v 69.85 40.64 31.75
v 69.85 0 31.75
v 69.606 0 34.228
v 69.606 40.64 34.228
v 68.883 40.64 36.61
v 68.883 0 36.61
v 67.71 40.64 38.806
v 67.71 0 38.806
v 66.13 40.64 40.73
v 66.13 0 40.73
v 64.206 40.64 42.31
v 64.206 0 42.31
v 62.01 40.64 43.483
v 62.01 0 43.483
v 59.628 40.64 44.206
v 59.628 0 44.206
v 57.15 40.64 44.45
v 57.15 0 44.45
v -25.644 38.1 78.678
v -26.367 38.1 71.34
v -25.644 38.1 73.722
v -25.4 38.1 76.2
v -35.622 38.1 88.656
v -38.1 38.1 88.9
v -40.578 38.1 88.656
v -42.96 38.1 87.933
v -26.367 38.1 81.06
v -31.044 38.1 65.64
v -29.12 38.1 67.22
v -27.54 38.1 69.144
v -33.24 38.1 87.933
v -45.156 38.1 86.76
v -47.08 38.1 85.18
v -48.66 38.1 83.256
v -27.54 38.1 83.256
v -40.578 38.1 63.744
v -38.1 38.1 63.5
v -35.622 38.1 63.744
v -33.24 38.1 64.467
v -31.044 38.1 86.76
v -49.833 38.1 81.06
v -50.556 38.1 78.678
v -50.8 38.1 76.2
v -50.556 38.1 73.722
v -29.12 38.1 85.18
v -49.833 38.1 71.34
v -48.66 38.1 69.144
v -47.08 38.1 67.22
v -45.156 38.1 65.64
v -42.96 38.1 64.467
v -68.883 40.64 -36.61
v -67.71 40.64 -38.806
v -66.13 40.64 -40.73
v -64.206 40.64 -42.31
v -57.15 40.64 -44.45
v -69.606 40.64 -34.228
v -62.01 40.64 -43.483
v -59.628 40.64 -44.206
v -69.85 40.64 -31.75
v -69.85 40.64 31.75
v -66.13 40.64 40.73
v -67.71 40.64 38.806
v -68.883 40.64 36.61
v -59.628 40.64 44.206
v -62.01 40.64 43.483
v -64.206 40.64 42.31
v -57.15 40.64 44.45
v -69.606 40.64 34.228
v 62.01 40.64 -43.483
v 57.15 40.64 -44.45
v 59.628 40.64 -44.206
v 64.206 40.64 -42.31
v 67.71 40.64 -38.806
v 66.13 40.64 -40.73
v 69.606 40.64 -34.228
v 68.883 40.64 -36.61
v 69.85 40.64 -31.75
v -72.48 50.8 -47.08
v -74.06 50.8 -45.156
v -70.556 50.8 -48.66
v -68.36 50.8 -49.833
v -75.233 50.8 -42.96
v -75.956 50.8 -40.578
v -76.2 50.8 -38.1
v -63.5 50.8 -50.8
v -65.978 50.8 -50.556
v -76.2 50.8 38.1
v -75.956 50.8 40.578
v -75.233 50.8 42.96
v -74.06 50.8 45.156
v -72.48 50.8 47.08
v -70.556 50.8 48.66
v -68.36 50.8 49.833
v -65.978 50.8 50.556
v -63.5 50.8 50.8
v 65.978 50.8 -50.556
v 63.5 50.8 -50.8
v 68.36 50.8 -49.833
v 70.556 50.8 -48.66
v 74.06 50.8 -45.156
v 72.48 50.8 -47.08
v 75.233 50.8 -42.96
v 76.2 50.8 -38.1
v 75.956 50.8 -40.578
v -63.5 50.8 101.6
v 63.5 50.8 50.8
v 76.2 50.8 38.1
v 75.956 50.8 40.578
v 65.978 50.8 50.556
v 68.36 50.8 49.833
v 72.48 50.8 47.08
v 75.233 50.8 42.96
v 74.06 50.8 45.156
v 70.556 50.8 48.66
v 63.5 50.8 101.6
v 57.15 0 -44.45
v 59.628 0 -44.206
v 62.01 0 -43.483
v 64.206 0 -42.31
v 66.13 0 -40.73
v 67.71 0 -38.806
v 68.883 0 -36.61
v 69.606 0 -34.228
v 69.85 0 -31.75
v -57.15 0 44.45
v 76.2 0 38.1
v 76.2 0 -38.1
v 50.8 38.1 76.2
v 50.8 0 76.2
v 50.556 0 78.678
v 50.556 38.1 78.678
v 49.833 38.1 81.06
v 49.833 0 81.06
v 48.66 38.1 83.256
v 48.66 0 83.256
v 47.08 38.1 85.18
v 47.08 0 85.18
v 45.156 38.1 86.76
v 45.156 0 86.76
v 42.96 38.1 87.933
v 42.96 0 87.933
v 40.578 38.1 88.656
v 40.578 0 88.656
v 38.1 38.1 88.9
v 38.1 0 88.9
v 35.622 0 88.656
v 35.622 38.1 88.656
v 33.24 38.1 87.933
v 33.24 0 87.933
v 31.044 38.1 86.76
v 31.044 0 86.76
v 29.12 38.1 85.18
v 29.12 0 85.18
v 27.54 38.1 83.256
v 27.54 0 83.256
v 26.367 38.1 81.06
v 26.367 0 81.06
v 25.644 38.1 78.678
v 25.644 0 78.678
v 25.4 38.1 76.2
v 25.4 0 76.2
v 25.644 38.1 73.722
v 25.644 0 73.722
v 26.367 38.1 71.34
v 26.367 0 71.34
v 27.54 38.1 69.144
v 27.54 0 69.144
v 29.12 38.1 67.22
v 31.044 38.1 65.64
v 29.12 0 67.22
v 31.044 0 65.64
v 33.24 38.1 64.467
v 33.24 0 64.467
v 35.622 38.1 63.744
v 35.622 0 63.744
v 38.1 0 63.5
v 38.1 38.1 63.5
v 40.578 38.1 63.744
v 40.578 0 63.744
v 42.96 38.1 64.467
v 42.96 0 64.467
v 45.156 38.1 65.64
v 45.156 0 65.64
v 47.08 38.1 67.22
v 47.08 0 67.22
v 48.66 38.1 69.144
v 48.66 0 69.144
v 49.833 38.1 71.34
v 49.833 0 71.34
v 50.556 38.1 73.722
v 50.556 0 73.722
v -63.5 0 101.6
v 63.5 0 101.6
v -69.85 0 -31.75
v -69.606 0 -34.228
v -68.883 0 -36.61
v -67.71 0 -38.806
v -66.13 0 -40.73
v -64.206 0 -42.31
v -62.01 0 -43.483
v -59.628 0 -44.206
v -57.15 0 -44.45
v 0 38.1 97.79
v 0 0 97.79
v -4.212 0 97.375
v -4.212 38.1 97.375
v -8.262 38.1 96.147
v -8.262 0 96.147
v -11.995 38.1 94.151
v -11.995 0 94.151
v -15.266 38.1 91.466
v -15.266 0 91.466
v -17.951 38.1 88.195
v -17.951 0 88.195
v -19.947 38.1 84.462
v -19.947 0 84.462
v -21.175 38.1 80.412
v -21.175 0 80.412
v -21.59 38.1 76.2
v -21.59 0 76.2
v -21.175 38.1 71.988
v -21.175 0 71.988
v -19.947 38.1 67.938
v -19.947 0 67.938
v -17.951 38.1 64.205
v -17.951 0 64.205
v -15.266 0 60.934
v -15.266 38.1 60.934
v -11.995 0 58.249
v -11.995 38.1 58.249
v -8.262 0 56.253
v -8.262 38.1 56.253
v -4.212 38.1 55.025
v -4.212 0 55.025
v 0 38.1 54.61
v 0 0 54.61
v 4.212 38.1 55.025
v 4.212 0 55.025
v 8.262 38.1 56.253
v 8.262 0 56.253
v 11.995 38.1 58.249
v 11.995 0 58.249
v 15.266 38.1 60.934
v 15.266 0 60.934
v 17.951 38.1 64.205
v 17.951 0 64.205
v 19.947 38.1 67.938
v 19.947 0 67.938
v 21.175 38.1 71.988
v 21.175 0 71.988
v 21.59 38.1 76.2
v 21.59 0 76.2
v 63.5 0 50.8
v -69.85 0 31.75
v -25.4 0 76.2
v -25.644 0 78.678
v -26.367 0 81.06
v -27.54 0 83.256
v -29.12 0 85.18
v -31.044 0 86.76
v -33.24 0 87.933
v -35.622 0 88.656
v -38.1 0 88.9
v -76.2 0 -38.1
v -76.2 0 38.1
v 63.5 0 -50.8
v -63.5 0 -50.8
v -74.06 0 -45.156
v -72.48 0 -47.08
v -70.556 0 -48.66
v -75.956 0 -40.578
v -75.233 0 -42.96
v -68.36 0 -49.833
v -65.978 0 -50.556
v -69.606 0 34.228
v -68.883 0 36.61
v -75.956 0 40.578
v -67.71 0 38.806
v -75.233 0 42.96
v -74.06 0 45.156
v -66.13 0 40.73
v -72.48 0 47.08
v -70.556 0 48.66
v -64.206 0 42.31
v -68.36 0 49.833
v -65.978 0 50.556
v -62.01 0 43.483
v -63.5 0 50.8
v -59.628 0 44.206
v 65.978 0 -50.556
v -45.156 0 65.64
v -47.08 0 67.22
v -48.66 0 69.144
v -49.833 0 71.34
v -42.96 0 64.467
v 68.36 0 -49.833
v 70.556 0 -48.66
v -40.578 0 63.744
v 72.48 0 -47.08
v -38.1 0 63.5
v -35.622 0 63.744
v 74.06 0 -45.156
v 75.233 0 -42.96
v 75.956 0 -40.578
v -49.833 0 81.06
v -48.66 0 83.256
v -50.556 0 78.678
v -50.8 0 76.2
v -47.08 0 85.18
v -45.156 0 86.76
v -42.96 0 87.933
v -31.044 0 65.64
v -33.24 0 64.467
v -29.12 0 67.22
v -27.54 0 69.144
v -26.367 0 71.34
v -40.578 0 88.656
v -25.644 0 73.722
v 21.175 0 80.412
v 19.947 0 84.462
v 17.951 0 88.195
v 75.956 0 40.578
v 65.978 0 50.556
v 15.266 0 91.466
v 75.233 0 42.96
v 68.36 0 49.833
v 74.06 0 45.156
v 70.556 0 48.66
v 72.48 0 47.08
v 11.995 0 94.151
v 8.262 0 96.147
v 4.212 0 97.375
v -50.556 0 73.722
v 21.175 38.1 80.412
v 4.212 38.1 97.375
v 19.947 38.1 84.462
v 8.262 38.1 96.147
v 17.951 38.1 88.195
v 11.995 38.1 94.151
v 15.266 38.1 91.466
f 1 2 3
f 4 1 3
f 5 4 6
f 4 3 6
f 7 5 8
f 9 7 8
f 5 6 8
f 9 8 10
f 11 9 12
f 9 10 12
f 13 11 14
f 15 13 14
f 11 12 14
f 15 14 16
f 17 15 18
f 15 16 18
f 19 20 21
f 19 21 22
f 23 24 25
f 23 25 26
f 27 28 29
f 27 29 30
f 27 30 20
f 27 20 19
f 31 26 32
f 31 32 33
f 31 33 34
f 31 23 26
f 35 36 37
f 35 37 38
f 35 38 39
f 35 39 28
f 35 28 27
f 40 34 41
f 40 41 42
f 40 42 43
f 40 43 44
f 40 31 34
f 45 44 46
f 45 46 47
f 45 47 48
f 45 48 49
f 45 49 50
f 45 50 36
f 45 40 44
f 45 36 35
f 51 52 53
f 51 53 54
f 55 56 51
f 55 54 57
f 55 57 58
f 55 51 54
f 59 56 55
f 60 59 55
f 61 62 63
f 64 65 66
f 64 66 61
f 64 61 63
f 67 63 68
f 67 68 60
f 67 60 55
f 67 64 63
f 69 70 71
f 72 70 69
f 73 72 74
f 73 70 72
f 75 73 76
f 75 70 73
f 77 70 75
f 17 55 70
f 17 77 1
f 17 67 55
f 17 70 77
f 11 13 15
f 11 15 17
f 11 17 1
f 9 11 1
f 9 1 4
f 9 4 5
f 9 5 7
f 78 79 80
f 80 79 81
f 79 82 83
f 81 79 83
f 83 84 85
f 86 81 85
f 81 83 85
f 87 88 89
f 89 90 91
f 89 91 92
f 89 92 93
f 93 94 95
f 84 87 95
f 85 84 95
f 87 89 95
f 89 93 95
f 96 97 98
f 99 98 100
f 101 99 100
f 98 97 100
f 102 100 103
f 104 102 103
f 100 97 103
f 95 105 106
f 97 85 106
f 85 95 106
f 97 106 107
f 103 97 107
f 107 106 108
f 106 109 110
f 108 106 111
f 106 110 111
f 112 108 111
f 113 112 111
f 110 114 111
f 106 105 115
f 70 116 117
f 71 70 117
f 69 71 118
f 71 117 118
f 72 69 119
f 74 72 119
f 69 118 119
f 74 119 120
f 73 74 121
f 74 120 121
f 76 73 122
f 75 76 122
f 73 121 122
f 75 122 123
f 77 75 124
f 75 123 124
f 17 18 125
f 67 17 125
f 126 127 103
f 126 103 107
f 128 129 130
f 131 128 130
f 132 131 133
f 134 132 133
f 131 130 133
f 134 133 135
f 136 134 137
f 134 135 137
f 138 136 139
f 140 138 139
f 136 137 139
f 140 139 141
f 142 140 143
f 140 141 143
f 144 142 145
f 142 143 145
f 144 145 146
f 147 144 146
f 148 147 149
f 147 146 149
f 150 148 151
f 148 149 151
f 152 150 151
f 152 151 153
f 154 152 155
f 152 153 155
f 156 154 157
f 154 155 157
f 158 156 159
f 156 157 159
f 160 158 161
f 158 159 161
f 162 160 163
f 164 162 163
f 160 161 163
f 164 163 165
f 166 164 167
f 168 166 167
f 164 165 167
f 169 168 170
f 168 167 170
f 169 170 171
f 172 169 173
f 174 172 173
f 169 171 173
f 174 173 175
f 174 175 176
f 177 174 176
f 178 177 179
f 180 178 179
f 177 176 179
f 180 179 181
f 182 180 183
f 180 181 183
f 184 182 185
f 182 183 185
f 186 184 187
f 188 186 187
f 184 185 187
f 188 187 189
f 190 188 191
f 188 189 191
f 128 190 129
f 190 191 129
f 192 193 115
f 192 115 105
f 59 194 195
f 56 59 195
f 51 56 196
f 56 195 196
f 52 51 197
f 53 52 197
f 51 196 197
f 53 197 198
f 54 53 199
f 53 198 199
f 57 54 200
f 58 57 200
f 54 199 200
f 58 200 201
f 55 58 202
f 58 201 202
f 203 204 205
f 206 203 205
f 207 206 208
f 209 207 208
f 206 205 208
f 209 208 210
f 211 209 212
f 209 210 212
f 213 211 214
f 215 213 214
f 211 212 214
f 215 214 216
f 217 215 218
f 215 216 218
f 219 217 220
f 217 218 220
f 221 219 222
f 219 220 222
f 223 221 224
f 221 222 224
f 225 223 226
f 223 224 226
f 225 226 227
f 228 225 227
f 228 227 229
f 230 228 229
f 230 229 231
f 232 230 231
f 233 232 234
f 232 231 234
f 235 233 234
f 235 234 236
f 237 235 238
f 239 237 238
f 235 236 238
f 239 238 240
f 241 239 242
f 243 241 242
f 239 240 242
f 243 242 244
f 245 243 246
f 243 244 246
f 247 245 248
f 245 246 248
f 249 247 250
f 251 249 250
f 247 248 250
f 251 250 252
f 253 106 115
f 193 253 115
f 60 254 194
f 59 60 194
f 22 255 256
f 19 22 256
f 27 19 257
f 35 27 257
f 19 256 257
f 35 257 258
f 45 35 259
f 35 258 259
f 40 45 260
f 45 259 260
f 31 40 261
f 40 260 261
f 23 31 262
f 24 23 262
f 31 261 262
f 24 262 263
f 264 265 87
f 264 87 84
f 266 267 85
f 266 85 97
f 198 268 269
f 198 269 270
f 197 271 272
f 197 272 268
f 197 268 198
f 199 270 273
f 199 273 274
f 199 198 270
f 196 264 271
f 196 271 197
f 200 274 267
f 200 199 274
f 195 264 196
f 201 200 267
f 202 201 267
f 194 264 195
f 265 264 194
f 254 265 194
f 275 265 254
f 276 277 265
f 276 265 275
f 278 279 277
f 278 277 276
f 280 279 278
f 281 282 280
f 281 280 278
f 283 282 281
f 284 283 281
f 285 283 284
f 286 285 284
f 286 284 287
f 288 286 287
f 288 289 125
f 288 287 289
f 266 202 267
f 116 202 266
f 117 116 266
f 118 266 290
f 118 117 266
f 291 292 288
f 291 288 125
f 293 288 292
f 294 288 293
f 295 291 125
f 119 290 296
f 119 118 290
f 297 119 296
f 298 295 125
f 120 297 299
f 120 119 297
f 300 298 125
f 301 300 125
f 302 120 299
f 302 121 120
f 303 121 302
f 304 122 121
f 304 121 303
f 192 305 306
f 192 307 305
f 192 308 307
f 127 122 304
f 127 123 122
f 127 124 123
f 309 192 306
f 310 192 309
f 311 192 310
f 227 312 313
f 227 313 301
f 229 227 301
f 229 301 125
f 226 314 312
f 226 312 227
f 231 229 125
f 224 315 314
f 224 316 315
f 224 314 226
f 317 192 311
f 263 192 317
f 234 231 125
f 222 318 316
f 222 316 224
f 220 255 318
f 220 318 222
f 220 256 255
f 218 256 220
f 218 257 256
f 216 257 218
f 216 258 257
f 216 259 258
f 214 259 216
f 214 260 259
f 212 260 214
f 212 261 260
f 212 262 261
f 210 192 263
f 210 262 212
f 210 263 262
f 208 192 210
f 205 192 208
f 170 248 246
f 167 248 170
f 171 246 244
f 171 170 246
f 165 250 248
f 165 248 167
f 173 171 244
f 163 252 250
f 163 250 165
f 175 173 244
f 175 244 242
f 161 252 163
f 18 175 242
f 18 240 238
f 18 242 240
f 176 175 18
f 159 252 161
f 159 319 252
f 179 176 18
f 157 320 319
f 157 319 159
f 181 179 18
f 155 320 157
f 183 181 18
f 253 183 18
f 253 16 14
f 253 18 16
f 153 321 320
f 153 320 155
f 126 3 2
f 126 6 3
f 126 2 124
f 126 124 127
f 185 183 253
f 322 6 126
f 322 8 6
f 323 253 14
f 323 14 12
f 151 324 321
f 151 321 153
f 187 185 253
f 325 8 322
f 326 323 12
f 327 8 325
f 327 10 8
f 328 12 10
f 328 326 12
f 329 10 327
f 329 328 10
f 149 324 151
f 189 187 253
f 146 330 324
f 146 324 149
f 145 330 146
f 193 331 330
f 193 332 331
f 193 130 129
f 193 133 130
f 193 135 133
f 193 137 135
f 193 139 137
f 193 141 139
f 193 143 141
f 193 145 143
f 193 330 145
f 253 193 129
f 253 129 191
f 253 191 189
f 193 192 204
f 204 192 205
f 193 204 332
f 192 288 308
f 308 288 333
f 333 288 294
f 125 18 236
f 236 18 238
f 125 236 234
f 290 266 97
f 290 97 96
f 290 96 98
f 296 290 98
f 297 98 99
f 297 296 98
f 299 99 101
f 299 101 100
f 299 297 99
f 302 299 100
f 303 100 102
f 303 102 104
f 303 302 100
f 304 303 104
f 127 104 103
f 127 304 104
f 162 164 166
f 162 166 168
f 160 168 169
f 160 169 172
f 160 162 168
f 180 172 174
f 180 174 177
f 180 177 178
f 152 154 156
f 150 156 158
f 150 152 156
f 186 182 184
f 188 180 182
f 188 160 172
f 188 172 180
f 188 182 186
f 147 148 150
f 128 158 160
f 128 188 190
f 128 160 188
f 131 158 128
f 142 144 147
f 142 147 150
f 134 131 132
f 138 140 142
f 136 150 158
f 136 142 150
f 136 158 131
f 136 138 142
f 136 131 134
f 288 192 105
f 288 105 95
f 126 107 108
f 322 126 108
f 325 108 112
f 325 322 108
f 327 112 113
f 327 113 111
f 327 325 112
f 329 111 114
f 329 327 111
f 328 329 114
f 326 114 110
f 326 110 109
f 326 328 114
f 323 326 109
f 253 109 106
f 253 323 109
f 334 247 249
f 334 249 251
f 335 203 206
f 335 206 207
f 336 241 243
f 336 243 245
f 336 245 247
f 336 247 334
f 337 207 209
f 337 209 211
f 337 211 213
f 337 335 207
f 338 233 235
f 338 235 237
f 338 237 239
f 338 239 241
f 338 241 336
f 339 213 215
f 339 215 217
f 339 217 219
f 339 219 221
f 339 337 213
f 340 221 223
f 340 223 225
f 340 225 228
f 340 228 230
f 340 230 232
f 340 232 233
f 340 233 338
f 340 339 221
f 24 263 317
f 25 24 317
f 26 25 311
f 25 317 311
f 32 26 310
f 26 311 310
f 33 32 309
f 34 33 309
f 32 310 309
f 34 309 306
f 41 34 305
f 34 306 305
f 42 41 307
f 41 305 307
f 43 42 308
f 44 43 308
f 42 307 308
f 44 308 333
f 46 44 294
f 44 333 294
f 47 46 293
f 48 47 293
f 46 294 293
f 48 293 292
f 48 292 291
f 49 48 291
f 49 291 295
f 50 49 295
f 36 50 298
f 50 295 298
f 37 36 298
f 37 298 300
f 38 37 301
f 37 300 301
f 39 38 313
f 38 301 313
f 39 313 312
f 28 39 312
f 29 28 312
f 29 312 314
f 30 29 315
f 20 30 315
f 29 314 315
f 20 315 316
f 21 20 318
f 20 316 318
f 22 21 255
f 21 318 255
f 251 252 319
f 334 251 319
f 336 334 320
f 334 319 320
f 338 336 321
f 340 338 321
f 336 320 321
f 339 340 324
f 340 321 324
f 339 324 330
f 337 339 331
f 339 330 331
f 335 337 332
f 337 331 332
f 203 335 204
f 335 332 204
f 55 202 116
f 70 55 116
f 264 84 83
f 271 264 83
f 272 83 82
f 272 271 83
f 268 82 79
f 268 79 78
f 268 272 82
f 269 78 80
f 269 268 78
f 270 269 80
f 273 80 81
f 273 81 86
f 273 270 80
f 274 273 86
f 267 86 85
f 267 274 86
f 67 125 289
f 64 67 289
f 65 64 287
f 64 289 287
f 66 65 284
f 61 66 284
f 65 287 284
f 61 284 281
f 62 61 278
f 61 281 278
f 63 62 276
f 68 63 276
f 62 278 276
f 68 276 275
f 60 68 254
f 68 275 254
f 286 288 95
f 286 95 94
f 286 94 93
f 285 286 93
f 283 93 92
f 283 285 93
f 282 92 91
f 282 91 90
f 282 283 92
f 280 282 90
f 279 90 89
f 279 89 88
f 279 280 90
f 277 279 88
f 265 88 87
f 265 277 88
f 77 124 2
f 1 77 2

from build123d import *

# Parameters (mm, degrees)
F1_DEPTH = 50.8
F3_DEPTH = 40.64
F0_R     = 12.7
F4_DEPTH = 50.8
F5_DEPTH = 38.1


with BuildPart() as f1:
    # F0 (on Front) → F1 (new body)
    with BuildSketch(Plane.XZ):
        with BuildLine():
            Line((-63.5, -50.8), (63.5, -50.8))
            ThreePointArc((63.5, -50.8), (72.480256, -47.080256), (76.2, -38.1))
            Line((76.2, -38.1), (76.2, 38.1))
            ThreePointArc((76.2, 38.1), (72.480256, 47.080256), (63.5, 50.8))
            Line((63.5, 50.8), (-63.5, 50.8))
            ThreePointArc((-63.5, 50.8), (-72.480256, 47.080256), (-76.2, 38.1))
            Line((-76.2, 38.1), (-76.2, -38.1))
            ThreePointArc((-76.2, -38.1), (-72.480256, -47.080256), (-63.5, -50.8))
        make_face()
    extrude(amount=-F1_DEPTH)

    # F2 (on face) → F3 (cut)
    with BuildSketch(Plane.XZ):
        with BuildLine():
            Line((-57.15, -44.45), (57.15, -44.45))
            ThreePointArc((57.15, -44.45), (66.130256, -40.730256), (69.85, -31.75))
            Line((69.85, -31.75), (69.85, 31.75))
            ThreePointArc((69.85, 31.75), (66.130256, 40.730256), (57.15, 44.45))
            Line((57.15, 44.45), (-57.15, 44.45))
            ThreePointArc((-57.15, 44.45), (-66.130256, 40.730256), (-69.85, 31.75))
            Line((-69.85, 31.75), (-69.85, -31.75))
            ThreePointArc((-69.85, -31.75), (-66.130256, -40.730256), (-57.15, -44.45))
        make_face()
    extrude(amount=-F3_DEPTH, mode=Mode.SUBTRACT)

    # F0 (on Front) → F4 (join)
    with BuildSketch(Plane.XZ):
        Polygon((-63.5, 50.8), (63.5, 50.8), (63.5, 76.2), (63.5, 101.6), (0, 101.6), (-38.1, 101.6), (-63.5, 101.6), align=None)
        with BuildLine():
            ThreePointArc((-25.4, 76.2), (-47.080256, 67.219744), (-38.1, 88.9))
            ThreePointArc((-38.1, 88.9), (-29.119744, 85.180256), (-25.4, 76.2))
        make_face(mode=Mode.SUBTRACT)
        with BuildLine():
            ThreePointArc((21.59, 76.2), (-15.266435, 60.933565), (0, 97.79))
            ThreePointArc((0, 97.79), (15.266435, 91.466435), (21.59, 76.2))
        make_face(mode=Mode.SUBTRACT)
        with Locations((38.1, 76.2)):
            Circle(F0_R, mode=Mode.SUBTRACT)
        with Locations((38.1, 76.2)):
            Circle(F0_R)
        with BuildLine():
            ThreePointArc((21.59, 76.2), (15.266435, 91.466435), (0, 97.79))
            ThreePointArc((0, 97.79), (-15.266435, 60.933565), (21.59, 76.2))
        make_face()
        with BuildLine():
            ThreePointArc((-25.4, 76.2), (-29.119744, 85.180256), (-38.1, 88.9))
            ThreePointArc((-38.1, 88.9), (-47.080256, 67.219744), (-25.4, 76.2))
        make_face()
    extrude(amount=-F4_DEPTH)

    # F0 (on Front) → F5 (cut)
    with BuildSketch(Plane.XZ):
        with BuildLine():
            ThreePointArc((-25.4, 76.2), (-29.119744, 85.180256), (-38.1, 88.9))
            ThreePointArc((-38.1, 88.9), (-47.080256, 67.219744), (-25.4, 76.2))
        make_face()
        with BuildLine():
            ThreePointArc((21.59, 76.2), (15.266435, 91.466435), (0, 97.79))
            ThreePointArc((0, 97.79), (-15.266435, 60.933565), (21.59, 76.2))
        make_face()
        with Locations((38.1, 76.2)):
            Circle(F0_R)
    extrude(amount=-F5_DEPTH, mode=Mode.SUBTRACT)


solid = f1.part
